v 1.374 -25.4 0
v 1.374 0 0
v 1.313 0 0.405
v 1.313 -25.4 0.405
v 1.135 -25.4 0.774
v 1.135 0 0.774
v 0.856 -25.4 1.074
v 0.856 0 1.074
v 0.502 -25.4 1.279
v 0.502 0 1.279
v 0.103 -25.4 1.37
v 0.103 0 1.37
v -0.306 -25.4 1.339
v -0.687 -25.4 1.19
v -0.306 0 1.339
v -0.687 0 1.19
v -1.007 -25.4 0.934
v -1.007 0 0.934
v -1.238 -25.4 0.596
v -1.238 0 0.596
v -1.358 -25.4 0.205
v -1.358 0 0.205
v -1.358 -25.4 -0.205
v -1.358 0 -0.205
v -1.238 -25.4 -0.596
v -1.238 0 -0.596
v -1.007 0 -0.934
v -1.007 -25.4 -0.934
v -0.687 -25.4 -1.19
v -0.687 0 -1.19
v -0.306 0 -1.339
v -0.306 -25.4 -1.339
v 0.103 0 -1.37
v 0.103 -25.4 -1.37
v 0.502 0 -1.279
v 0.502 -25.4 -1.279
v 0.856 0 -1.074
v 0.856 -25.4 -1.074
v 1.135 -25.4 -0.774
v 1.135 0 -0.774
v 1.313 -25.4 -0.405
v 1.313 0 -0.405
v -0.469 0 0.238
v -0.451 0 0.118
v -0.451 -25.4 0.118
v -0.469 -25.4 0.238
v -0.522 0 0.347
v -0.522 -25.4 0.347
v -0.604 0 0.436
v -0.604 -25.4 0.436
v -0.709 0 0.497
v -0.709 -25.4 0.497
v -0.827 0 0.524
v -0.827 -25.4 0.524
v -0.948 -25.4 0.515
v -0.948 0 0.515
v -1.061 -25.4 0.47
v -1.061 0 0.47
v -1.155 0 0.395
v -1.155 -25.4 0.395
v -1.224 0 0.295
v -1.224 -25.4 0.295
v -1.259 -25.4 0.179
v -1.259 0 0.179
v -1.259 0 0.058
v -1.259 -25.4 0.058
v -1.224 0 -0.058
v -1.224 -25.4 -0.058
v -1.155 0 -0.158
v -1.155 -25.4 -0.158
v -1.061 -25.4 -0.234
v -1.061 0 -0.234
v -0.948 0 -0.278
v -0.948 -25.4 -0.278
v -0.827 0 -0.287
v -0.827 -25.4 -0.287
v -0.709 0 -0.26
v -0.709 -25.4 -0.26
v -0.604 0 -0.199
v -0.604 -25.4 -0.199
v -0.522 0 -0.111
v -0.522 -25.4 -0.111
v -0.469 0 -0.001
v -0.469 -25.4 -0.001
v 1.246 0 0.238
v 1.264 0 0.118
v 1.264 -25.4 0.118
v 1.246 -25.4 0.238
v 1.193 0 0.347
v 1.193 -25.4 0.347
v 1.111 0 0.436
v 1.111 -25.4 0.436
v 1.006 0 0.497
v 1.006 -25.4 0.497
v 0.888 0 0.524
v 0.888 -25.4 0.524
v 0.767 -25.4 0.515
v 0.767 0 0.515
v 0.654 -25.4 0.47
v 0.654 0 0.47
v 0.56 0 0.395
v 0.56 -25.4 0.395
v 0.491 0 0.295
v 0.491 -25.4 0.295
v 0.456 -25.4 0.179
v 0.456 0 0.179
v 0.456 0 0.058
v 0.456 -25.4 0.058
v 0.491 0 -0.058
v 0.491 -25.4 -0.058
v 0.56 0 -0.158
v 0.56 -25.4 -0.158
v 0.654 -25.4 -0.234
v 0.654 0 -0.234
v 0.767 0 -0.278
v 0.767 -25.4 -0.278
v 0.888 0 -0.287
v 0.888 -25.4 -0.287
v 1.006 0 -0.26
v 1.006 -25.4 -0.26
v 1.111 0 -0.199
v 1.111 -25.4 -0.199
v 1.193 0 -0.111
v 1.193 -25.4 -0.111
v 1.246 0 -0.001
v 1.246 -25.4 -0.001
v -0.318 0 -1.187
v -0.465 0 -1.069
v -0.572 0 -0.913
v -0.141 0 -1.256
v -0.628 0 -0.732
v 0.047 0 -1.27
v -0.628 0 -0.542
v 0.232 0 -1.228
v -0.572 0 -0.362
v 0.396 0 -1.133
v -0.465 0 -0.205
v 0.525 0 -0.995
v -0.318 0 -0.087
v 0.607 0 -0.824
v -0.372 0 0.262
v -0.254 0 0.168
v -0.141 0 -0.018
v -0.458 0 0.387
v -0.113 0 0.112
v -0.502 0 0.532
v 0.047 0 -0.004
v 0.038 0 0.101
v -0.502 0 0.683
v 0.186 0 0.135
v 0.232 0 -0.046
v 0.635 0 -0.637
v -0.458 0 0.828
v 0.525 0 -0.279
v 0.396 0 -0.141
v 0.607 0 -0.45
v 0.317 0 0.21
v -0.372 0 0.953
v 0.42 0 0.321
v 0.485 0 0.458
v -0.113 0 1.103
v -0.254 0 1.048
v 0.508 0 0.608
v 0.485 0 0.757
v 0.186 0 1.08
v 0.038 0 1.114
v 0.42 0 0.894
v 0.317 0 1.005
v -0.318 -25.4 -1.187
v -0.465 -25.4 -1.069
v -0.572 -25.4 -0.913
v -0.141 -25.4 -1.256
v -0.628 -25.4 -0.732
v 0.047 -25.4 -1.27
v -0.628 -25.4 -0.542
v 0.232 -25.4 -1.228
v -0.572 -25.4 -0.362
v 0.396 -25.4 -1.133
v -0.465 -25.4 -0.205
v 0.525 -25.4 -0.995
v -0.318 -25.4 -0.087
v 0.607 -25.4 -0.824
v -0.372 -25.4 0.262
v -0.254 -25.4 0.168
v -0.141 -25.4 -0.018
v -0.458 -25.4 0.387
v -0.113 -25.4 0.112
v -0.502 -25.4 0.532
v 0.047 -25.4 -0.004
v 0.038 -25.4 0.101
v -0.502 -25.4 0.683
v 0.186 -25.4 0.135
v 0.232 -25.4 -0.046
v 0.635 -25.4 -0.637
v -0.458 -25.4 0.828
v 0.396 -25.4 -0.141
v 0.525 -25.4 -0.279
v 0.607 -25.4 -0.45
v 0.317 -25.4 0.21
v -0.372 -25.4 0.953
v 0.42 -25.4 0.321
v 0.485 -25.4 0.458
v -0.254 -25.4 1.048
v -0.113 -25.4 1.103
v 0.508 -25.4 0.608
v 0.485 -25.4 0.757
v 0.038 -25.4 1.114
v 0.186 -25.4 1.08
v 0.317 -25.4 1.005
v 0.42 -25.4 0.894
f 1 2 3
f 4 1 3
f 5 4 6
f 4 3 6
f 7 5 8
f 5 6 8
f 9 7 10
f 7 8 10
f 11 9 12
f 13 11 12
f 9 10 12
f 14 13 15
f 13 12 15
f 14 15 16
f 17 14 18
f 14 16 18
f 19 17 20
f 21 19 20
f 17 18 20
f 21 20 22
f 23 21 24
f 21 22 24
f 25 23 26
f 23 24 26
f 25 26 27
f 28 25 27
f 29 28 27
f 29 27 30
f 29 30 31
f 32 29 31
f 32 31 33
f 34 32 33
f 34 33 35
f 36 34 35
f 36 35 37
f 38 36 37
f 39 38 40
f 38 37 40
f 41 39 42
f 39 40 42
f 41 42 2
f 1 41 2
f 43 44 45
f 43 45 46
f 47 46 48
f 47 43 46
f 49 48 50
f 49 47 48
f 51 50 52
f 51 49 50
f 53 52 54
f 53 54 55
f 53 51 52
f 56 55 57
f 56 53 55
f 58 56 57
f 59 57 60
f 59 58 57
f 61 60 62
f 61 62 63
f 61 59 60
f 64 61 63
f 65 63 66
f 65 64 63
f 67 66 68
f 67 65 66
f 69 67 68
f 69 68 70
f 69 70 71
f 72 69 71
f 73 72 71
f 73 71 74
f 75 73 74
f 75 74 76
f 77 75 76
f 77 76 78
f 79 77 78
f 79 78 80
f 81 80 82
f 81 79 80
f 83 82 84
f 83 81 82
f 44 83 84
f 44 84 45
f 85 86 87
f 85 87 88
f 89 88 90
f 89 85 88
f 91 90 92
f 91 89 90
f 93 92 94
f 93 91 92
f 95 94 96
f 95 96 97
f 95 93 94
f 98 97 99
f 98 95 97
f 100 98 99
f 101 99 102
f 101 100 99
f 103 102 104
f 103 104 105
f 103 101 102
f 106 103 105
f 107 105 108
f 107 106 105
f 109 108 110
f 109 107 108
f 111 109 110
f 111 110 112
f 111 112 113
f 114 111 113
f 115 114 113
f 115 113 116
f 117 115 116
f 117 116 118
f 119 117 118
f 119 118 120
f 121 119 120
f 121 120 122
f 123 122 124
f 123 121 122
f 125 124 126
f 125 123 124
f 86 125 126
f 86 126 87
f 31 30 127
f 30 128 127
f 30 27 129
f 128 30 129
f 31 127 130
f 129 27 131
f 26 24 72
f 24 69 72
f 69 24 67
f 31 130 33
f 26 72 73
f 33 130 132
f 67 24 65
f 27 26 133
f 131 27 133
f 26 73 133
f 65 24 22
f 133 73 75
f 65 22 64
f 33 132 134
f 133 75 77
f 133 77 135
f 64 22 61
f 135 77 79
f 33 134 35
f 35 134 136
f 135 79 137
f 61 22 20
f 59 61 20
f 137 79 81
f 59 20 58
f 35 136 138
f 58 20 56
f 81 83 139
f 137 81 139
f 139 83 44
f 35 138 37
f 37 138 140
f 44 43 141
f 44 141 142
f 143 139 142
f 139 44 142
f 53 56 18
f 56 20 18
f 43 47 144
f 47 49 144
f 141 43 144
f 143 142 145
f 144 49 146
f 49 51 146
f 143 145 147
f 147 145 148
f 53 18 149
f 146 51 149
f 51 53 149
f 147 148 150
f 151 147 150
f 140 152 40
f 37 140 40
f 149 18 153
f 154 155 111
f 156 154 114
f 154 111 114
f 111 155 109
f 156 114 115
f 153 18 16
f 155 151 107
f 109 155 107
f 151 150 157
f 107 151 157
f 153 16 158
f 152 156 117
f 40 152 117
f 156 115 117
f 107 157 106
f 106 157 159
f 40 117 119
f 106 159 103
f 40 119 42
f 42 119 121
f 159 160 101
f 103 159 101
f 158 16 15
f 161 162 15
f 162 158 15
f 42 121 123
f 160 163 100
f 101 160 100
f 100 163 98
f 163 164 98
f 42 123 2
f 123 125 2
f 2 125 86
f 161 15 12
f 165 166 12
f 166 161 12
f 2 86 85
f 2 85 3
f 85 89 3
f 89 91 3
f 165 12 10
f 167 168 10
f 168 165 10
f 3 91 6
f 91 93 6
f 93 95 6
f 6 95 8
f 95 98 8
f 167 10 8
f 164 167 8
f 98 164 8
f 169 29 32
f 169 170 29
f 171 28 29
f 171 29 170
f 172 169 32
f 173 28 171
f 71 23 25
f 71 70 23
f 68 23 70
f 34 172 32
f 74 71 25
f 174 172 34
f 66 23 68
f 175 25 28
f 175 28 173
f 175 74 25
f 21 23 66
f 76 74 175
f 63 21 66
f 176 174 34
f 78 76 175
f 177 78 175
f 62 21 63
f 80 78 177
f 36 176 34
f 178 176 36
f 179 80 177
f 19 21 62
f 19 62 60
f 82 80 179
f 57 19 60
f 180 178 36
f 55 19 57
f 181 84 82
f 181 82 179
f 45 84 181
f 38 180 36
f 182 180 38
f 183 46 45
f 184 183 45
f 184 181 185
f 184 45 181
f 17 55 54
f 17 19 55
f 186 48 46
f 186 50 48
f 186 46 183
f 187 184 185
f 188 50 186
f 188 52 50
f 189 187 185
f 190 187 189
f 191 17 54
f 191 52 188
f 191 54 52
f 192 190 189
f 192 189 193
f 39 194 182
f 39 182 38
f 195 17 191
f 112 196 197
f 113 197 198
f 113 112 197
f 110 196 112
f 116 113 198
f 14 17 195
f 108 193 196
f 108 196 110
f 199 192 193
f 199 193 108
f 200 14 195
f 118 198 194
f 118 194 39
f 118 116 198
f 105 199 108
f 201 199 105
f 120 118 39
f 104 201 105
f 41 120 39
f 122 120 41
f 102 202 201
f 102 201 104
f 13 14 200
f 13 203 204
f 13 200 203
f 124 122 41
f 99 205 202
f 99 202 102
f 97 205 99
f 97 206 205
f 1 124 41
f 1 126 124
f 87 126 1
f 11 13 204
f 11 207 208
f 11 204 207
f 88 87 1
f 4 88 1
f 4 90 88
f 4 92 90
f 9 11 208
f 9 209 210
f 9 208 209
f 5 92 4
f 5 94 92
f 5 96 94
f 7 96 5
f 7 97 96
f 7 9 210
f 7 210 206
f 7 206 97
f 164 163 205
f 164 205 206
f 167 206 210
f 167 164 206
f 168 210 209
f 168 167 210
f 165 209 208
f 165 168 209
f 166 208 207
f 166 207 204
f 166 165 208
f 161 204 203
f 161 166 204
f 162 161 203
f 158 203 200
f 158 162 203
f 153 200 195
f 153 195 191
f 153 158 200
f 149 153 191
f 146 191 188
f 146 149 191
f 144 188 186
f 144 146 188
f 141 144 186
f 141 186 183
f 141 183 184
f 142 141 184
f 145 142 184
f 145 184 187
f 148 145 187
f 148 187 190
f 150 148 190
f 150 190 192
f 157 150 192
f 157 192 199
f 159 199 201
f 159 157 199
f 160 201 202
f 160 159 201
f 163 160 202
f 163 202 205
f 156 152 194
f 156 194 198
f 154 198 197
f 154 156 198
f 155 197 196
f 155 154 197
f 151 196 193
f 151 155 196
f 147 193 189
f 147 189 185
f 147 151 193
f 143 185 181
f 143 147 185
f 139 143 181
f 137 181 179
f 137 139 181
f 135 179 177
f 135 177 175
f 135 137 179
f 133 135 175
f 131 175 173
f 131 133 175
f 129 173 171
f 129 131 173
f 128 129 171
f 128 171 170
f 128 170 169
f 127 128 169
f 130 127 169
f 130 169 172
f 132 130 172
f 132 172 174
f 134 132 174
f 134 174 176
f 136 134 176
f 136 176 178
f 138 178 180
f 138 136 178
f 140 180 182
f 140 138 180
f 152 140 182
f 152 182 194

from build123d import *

# Parameters (mm, degrees)
F0_R     = 1.37362
F0_R_2   = 0.635
F0_R_3   = 0.4064
F0_R_4   = 0.508
F1_DEPTH = 25.4


with BuildPart() as f1:
    # F0 (on Front) → F1 (new body)
    with BuildSketch(Plane.XZ):
        Circle(F0_R)
        with Locations((0, -0.63702)):
            Circle(F0_R_2, mode=Mode.SUBTRACT)
        with Locations((-0.857486, 0.11839)):
            Circle(F0_R_3, mode=Mode.SUBTRACT)
        with Locations((0, 0.60758)):
            Circle(F0_R_4, mode=Mode.SUBTRACT)
        with Locations((0.857486, 0.11839)):
            Circle(F0_R_3, mode=Mode.SUBTRACT)
    extrude(amount=F1_DEPTH)


solid = f1.part
